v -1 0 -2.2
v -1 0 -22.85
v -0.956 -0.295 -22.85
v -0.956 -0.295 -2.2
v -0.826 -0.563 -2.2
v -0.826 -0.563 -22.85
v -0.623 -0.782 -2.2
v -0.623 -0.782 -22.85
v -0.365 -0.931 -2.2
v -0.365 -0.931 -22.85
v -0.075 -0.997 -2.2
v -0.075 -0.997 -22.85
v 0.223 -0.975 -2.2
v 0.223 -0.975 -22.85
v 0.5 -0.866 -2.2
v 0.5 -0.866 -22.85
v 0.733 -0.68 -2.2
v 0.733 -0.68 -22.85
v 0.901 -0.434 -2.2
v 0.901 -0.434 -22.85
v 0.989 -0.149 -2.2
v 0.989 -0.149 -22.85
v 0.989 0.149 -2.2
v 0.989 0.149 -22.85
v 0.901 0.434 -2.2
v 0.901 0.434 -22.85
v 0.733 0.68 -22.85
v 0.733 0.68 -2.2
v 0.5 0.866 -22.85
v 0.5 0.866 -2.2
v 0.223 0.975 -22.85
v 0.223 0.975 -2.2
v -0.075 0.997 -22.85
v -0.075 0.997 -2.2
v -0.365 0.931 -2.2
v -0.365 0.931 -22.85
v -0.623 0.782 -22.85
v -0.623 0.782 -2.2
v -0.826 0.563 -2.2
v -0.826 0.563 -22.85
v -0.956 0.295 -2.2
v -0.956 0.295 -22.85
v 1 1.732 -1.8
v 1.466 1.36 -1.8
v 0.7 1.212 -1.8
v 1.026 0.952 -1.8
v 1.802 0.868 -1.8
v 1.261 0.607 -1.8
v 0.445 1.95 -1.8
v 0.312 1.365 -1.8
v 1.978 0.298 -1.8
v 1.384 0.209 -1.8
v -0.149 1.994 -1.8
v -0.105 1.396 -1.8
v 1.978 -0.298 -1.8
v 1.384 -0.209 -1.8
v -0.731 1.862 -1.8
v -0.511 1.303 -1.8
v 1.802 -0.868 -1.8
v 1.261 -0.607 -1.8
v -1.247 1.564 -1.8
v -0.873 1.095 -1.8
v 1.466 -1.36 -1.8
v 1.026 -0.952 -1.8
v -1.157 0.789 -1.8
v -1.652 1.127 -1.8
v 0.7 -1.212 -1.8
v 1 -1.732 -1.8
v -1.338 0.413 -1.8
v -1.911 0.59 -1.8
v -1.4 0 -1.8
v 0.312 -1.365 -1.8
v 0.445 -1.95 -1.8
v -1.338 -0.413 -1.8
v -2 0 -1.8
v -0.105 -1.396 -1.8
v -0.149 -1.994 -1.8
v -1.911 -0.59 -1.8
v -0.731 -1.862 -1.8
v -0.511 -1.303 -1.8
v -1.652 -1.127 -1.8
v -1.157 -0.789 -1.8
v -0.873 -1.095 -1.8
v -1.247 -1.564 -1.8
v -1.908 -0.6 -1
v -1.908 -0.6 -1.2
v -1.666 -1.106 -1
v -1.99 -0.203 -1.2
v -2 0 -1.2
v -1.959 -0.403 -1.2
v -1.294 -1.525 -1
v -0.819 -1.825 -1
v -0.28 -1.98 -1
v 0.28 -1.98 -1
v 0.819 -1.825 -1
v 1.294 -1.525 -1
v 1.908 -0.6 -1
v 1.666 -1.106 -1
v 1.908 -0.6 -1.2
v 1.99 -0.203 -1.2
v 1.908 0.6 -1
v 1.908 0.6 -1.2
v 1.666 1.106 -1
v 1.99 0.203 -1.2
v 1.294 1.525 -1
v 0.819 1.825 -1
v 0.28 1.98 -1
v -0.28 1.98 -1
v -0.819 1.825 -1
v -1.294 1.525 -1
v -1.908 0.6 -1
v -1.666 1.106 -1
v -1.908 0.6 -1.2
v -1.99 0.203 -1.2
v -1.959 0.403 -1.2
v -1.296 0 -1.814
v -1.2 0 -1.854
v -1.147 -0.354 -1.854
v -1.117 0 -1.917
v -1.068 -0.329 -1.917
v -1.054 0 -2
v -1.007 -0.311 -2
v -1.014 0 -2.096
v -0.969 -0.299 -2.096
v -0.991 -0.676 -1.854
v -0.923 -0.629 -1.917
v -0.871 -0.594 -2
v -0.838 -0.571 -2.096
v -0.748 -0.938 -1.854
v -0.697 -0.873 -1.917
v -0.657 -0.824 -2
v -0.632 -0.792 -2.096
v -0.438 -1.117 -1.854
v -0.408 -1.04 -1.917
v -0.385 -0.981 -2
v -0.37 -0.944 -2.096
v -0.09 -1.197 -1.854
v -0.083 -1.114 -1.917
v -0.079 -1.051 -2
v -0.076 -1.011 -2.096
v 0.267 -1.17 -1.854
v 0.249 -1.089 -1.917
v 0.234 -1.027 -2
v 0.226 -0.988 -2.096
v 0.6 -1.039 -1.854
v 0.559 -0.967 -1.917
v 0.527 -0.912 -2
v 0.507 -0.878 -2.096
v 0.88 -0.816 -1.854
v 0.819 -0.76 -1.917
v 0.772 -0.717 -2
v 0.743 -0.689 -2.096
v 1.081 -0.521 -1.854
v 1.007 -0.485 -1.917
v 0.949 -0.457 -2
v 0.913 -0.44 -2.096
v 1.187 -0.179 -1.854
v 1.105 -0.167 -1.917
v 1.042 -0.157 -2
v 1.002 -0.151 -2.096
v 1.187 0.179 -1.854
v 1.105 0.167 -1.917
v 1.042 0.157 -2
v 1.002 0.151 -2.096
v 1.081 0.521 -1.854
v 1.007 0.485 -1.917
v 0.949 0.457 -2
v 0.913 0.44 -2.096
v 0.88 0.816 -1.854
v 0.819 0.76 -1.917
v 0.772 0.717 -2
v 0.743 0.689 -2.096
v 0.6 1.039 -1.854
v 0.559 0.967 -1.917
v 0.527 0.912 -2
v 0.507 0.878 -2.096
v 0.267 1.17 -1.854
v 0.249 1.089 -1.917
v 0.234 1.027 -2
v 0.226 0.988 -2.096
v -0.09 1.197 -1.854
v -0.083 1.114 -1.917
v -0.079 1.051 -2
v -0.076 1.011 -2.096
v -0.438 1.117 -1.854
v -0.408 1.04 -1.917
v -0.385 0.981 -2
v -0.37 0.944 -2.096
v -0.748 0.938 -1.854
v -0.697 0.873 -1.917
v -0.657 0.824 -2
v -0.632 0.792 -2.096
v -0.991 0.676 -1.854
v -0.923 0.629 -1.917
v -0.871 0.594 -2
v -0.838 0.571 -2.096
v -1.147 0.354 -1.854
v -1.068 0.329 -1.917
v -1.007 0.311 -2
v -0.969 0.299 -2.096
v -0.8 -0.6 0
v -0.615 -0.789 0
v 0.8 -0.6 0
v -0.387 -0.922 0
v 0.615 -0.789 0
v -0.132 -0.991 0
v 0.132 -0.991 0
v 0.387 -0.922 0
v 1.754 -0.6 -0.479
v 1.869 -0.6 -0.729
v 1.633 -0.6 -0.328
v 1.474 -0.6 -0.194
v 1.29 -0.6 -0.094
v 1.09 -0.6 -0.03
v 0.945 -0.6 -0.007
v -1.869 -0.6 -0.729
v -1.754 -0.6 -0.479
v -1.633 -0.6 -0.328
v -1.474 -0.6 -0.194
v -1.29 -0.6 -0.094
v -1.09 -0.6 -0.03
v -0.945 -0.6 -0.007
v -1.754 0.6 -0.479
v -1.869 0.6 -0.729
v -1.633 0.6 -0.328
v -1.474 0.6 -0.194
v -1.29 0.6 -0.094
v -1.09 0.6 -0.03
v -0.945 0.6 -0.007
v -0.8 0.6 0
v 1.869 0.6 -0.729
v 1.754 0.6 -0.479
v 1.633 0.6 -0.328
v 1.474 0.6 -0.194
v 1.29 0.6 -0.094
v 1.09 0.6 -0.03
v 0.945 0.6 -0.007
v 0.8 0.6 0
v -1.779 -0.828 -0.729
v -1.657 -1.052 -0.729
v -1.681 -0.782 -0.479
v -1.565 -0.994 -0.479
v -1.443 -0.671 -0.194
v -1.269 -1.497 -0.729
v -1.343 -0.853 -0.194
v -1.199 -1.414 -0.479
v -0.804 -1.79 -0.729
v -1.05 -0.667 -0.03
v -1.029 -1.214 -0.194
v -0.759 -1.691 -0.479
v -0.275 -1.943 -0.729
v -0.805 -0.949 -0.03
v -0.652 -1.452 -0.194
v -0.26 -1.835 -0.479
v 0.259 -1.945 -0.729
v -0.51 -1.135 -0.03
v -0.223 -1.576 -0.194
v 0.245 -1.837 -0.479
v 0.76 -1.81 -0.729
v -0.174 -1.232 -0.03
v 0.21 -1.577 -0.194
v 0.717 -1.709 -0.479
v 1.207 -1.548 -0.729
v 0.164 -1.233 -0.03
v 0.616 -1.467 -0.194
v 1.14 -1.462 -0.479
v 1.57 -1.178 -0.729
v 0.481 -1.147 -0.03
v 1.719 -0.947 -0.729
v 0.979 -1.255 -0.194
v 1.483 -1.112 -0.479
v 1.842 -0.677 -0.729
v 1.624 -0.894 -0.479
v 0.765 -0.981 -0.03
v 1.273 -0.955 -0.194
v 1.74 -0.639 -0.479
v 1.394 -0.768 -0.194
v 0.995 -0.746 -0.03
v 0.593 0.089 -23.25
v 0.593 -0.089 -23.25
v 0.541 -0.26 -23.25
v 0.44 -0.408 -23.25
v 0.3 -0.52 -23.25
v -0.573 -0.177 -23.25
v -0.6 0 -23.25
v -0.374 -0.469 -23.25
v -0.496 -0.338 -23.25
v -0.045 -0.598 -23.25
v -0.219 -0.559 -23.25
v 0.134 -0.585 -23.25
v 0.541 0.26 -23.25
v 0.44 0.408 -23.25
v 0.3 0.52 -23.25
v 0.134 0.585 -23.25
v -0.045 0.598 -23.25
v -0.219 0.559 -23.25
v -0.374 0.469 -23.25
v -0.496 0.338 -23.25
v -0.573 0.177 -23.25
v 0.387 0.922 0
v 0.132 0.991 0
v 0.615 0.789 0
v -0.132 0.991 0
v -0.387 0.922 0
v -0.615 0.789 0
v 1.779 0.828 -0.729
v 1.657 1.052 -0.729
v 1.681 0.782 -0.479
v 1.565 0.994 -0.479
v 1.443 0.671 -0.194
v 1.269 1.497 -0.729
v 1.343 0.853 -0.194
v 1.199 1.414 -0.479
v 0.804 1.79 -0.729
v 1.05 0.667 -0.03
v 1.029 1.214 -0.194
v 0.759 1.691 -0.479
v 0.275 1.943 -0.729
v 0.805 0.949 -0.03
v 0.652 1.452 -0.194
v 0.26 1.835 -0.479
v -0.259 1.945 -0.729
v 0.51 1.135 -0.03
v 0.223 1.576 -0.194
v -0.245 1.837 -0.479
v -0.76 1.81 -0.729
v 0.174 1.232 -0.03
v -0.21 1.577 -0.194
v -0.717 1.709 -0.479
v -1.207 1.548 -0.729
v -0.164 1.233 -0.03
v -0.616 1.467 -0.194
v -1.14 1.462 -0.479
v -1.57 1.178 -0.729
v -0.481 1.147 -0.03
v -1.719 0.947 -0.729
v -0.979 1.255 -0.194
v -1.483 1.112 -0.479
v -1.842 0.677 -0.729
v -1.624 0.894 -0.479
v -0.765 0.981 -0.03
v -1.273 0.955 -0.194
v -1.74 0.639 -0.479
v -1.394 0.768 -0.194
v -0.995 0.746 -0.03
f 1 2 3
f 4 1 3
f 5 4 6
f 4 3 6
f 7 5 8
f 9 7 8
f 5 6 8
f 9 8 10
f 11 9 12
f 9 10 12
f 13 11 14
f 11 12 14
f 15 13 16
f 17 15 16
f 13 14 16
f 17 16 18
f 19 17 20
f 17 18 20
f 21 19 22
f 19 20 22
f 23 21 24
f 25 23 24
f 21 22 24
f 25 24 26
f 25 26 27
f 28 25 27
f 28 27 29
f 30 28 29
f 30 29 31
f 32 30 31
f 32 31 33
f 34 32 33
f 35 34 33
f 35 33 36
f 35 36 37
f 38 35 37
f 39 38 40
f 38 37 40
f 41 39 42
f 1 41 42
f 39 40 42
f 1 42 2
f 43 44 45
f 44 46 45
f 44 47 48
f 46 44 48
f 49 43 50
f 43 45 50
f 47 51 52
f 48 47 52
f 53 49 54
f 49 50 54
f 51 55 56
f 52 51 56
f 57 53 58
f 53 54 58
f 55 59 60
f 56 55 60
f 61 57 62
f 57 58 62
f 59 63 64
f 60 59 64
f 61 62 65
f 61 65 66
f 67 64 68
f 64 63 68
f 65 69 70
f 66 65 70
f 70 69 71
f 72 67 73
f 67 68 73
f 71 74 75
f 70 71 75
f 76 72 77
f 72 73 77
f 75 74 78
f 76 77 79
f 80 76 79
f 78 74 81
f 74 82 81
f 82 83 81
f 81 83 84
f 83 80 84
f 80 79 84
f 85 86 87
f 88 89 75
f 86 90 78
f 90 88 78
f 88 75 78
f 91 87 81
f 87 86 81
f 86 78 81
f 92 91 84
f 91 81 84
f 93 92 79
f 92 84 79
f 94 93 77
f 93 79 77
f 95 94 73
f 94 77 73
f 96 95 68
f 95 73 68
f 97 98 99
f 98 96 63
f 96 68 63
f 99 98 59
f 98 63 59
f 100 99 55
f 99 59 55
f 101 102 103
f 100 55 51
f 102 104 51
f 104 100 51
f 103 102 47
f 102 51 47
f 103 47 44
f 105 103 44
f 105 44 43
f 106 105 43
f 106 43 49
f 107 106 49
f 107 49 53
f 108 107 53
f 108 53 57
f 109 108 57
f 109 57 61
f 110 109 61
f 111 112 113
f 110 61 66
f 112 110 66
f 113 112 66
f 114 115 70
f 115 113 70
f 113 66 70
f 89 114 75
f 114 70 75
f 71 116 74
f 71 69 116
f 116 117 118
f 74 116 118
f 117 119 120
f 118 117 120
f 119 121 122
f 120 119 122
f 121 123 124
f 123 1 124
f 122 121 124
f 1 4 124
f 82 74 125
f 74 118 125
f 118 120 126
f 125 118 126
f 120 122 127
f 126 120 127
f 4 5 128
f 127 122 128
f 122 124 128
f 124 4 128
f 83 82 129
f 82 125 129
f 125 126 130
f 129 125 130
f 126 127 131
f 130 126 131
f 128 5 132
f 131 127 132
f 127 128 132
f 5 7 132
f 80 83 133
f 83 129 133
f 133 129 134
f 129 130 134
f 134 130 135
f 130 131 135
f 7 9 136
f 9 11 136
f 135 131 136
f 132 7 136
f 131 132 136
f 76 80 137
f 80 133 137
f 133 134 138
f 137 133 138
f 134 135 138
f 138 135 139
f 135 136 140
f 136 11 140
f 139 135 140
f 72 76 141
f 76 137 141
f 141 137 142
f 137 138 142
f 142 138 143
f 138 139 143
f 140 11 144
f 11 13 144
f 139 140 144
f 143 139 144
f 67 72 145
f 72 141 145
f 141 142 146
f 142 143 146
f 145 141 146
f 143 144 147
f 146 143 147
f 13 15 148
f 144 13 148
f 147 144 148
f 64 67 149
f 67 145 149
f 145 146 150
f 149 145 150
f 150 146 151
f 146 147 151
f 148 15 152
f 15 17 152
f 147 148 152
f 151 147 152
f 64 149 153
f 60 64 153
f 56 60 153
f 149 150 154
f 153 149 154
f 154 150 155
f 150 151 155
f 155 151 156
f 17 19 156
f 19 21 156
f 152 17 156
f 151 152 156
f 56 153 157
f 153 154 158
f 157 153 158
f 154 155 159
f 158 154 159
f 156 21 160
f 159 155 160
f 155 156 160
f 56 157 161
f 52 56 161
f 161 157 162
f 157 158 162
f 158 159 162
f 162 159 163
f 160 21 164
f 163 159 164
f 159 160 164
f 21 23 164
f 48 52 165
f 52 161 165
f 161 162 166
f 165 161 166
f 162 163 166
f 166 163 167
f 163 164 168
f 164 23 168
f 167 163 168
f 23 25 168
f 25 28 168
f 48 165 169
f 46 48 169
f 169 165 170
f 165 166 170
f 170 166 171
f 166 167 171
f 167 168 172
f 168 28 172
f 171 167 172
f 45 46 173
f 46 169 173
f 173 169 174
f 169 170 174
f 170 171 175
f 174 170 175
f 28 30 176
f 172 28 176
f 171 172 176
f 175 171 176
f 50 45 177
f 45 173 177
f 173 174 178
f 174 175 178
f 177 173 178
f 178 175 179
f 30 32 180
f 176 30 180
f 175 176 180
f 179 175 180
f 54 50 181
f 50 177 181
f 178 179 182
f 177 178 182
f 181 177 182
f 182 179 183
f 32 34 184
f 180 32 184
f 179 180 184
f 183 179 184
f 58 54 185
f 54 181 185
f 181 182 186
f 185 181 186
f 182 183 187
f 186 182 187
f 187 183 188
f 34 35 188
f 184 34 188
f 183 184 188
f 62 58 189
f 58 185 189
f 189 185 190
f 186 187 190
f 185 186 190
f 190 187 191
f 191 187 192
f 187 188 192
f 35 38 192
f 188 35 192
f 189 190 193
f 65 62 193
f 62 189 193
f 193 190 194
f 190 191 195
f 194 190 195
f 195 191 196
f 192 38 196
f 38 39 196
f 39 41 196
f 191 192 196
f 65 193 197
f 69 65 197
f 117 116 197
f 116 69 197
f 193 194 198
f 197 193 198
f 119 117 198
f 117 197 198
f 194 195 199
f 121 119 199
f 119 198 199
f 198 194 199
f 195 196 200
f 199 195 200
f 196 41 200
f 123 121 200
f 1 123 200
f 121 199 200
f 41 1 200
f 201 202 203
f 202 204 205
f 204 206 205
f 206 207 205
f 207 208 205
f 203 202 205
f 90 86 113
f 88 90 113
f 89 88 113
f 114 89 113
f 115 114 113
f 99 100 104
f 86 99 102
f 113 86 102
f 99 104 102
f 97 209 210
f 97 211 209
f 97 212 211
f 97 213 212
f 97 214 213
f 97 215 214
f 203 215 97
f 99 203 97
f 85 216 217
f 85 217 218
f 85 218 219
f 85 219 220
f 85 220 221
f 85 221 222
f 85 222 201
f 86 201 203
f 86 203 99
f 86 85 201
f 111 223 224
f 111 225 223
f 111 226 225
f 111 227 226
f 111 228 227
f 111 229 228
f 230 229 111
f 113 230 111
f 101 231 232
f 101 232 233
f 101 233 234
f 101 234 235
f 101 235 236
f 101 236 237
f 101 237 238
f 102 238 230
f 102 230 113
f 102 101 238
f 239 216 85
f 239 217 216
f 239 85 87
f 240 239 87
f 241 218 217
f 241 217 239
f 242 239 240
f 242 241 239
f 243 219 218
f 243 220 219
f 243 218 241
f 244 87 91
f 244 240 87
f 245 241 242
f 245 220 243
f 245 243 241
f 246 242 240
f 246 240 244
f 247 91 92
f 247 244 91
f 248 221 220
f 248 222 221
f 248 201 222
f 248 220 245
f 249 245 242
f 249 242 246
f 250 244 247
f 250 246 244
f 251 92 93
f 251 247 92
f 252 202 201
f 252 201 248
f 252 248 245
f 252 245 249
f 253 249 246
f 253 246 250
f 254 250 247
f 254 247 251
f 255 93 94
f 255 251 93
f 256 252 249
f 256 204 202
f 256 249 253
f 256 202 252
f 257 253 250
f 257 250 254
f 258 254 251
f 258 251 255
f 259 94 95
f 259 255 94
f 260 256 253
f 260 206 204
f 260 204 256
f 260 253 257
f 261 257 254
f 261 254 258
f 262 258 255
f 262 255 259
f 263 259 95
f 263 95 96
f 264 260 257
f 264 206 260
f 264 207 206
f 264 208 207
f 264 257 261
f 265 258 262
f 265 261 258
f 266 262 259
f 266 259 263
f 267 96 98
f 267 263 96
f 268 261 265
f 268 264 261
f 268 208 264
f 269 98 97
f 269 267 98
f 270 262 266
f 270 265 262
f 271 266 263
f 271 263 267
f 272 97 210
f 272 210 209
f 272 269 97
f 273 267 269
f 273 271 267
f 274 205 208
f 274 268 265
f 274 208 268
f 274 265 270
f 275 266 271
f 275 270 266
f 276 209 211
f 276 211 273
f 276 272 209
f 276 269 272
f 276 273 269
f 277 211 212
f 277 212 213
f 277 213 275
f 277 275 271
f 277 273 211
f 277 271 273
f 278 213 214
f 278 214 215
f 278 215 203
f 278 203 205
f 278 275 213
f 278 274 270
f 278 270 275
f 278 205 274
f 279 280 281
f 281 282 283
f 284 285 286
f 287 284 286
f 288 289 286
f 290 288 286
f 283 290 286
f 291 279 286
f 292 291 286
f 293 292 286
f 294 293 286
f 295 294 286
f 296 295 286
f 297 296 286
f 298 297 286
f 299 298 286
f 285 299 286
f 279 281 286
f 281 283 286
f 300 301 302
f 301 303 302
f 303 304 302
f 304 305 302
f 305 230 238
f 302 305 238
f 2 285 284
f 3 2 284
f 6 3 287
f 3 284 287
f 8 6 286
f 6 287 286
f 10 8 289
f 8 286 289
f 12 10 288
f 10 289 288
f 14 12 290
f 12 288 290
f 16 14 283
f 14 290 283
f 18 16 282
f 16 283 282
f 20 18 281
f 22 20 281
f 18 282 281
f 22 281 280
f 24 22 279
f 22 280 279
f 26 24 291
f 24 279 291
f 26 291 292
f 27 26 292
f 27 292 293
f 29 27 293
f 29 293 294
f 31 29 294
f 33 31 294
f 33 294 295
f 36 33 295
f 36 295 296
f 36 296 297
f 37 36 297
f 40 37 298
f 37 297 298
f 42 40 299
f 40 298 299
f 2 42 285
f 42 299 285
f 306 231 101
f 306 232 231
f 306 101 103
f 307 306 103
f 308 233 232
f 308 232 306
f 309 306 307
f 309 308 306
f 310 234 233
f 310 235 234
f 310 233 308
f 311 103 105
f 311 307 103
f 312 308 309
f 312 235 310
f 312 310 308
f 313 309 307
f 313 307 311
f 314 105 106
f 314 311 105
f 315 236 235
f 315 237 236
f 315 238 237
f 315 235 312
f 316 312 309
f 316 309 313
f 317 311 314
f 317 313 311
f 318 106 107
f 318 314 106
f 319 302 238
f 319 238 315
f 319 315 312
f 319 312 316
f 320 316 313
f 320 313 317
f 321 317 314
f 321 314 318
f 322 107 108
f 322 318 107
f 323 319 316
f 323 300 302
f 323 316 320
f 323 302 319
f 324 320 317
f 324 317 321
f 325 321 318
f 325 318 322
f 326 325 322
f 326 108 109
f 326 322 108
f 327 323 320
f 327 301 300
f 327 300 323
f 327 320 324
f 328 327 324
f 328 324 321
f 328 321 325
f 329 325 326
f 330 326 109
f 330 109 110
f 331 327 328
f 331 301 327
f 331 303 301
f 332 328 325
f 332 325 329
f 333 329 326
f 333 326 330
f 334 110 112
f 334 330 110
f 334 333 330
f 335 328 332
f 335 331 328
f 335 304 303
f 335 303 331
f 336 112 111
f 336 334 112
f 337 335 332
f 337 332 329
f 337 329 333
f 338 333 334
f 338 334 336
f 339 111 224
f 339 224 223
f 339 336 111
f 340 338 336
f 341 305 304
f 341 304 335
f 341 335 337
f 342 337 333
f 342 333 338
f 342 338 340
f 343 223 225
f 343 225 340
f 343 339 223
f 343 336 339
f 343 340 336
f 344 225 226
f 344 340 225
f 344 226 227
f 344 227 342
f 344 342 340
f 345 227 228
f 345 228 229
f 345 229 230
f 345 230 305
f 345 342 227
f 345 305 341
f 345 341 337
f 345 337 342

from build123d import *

# Parameters (mm, degrees)
SKETCH_2_W               = 1.2
SKETCH_2_H               = 1.2
CUT_EXTRUDE_1_DEPTH      = 3
CUT_EXTRUDE_1_DEPTH_BACK = 3
CHAMFER_1_SIZE           = 0.4
FILLET_1_R               = 1
FILLET_2_R               = 0.4


with BuildPart() as part:
    # Эскиз1 → Повернуть1 (revolve)
    with BuildSketch(Plane(origin=(0, 0, 0), x_dir=(1, 0, 0), z_dir=(0, 1, 0))):
        Polygon((0, 0), (-2, 0), (-2, 1.8), (-1, 1.8), (-1, 23.25), (0, 23.25), align=None)
    revolve(axis=Axis((0, 0, -23.25), (0, 0, 1)))

    # Эскиз2 → Вырез-Вытянуть1 (cut, two sides)
    with BuildSketch(Plane(origin=(0, 0, 0), x_dir=(0, 0, -1), z_dir=(1, 0, 0))) as cut_extrude_1_sk:
        with Locations((0.6, 0)):
            Rectangle(SKETCH_2_W, SKETCH_2_H)
    extrude(amount=CUT_EXTRUDE_1_DEPTH, mode=Mode.SUBTRACT)
    extrude(cut_extrude_1_sk.sketch, amount=-CUT_EXTRUDE_1_DEPTH_BACK, mode=Mode.SUBTRACT)

    # Фаска1
    chamfer_1_edges = [part.edges().sort_by_distance(p)[0] for p in [
        (1, 0, -23.25),
    ]]
    chamfer(chamfer_1_edges, length=CHAMFER_1_SIZE)

    # Скругление1
    fillet_1_edges = [part.edges().sort_by_distance(p)[0] for p in [
        (0, 2, 0),
        (0, -2, 0),
    ]]
    fillet(fillet_1_edges, radius=FILLET_1_R)

    # Скругление2
    fillet_2_edges = [part.edges().sort_by_distance(p)[0] for p in [
        (1, 0, -1.8),
    ]]
    fillet(fillet_2_edges, radius=FILLET_2_R)


solid = part.part
